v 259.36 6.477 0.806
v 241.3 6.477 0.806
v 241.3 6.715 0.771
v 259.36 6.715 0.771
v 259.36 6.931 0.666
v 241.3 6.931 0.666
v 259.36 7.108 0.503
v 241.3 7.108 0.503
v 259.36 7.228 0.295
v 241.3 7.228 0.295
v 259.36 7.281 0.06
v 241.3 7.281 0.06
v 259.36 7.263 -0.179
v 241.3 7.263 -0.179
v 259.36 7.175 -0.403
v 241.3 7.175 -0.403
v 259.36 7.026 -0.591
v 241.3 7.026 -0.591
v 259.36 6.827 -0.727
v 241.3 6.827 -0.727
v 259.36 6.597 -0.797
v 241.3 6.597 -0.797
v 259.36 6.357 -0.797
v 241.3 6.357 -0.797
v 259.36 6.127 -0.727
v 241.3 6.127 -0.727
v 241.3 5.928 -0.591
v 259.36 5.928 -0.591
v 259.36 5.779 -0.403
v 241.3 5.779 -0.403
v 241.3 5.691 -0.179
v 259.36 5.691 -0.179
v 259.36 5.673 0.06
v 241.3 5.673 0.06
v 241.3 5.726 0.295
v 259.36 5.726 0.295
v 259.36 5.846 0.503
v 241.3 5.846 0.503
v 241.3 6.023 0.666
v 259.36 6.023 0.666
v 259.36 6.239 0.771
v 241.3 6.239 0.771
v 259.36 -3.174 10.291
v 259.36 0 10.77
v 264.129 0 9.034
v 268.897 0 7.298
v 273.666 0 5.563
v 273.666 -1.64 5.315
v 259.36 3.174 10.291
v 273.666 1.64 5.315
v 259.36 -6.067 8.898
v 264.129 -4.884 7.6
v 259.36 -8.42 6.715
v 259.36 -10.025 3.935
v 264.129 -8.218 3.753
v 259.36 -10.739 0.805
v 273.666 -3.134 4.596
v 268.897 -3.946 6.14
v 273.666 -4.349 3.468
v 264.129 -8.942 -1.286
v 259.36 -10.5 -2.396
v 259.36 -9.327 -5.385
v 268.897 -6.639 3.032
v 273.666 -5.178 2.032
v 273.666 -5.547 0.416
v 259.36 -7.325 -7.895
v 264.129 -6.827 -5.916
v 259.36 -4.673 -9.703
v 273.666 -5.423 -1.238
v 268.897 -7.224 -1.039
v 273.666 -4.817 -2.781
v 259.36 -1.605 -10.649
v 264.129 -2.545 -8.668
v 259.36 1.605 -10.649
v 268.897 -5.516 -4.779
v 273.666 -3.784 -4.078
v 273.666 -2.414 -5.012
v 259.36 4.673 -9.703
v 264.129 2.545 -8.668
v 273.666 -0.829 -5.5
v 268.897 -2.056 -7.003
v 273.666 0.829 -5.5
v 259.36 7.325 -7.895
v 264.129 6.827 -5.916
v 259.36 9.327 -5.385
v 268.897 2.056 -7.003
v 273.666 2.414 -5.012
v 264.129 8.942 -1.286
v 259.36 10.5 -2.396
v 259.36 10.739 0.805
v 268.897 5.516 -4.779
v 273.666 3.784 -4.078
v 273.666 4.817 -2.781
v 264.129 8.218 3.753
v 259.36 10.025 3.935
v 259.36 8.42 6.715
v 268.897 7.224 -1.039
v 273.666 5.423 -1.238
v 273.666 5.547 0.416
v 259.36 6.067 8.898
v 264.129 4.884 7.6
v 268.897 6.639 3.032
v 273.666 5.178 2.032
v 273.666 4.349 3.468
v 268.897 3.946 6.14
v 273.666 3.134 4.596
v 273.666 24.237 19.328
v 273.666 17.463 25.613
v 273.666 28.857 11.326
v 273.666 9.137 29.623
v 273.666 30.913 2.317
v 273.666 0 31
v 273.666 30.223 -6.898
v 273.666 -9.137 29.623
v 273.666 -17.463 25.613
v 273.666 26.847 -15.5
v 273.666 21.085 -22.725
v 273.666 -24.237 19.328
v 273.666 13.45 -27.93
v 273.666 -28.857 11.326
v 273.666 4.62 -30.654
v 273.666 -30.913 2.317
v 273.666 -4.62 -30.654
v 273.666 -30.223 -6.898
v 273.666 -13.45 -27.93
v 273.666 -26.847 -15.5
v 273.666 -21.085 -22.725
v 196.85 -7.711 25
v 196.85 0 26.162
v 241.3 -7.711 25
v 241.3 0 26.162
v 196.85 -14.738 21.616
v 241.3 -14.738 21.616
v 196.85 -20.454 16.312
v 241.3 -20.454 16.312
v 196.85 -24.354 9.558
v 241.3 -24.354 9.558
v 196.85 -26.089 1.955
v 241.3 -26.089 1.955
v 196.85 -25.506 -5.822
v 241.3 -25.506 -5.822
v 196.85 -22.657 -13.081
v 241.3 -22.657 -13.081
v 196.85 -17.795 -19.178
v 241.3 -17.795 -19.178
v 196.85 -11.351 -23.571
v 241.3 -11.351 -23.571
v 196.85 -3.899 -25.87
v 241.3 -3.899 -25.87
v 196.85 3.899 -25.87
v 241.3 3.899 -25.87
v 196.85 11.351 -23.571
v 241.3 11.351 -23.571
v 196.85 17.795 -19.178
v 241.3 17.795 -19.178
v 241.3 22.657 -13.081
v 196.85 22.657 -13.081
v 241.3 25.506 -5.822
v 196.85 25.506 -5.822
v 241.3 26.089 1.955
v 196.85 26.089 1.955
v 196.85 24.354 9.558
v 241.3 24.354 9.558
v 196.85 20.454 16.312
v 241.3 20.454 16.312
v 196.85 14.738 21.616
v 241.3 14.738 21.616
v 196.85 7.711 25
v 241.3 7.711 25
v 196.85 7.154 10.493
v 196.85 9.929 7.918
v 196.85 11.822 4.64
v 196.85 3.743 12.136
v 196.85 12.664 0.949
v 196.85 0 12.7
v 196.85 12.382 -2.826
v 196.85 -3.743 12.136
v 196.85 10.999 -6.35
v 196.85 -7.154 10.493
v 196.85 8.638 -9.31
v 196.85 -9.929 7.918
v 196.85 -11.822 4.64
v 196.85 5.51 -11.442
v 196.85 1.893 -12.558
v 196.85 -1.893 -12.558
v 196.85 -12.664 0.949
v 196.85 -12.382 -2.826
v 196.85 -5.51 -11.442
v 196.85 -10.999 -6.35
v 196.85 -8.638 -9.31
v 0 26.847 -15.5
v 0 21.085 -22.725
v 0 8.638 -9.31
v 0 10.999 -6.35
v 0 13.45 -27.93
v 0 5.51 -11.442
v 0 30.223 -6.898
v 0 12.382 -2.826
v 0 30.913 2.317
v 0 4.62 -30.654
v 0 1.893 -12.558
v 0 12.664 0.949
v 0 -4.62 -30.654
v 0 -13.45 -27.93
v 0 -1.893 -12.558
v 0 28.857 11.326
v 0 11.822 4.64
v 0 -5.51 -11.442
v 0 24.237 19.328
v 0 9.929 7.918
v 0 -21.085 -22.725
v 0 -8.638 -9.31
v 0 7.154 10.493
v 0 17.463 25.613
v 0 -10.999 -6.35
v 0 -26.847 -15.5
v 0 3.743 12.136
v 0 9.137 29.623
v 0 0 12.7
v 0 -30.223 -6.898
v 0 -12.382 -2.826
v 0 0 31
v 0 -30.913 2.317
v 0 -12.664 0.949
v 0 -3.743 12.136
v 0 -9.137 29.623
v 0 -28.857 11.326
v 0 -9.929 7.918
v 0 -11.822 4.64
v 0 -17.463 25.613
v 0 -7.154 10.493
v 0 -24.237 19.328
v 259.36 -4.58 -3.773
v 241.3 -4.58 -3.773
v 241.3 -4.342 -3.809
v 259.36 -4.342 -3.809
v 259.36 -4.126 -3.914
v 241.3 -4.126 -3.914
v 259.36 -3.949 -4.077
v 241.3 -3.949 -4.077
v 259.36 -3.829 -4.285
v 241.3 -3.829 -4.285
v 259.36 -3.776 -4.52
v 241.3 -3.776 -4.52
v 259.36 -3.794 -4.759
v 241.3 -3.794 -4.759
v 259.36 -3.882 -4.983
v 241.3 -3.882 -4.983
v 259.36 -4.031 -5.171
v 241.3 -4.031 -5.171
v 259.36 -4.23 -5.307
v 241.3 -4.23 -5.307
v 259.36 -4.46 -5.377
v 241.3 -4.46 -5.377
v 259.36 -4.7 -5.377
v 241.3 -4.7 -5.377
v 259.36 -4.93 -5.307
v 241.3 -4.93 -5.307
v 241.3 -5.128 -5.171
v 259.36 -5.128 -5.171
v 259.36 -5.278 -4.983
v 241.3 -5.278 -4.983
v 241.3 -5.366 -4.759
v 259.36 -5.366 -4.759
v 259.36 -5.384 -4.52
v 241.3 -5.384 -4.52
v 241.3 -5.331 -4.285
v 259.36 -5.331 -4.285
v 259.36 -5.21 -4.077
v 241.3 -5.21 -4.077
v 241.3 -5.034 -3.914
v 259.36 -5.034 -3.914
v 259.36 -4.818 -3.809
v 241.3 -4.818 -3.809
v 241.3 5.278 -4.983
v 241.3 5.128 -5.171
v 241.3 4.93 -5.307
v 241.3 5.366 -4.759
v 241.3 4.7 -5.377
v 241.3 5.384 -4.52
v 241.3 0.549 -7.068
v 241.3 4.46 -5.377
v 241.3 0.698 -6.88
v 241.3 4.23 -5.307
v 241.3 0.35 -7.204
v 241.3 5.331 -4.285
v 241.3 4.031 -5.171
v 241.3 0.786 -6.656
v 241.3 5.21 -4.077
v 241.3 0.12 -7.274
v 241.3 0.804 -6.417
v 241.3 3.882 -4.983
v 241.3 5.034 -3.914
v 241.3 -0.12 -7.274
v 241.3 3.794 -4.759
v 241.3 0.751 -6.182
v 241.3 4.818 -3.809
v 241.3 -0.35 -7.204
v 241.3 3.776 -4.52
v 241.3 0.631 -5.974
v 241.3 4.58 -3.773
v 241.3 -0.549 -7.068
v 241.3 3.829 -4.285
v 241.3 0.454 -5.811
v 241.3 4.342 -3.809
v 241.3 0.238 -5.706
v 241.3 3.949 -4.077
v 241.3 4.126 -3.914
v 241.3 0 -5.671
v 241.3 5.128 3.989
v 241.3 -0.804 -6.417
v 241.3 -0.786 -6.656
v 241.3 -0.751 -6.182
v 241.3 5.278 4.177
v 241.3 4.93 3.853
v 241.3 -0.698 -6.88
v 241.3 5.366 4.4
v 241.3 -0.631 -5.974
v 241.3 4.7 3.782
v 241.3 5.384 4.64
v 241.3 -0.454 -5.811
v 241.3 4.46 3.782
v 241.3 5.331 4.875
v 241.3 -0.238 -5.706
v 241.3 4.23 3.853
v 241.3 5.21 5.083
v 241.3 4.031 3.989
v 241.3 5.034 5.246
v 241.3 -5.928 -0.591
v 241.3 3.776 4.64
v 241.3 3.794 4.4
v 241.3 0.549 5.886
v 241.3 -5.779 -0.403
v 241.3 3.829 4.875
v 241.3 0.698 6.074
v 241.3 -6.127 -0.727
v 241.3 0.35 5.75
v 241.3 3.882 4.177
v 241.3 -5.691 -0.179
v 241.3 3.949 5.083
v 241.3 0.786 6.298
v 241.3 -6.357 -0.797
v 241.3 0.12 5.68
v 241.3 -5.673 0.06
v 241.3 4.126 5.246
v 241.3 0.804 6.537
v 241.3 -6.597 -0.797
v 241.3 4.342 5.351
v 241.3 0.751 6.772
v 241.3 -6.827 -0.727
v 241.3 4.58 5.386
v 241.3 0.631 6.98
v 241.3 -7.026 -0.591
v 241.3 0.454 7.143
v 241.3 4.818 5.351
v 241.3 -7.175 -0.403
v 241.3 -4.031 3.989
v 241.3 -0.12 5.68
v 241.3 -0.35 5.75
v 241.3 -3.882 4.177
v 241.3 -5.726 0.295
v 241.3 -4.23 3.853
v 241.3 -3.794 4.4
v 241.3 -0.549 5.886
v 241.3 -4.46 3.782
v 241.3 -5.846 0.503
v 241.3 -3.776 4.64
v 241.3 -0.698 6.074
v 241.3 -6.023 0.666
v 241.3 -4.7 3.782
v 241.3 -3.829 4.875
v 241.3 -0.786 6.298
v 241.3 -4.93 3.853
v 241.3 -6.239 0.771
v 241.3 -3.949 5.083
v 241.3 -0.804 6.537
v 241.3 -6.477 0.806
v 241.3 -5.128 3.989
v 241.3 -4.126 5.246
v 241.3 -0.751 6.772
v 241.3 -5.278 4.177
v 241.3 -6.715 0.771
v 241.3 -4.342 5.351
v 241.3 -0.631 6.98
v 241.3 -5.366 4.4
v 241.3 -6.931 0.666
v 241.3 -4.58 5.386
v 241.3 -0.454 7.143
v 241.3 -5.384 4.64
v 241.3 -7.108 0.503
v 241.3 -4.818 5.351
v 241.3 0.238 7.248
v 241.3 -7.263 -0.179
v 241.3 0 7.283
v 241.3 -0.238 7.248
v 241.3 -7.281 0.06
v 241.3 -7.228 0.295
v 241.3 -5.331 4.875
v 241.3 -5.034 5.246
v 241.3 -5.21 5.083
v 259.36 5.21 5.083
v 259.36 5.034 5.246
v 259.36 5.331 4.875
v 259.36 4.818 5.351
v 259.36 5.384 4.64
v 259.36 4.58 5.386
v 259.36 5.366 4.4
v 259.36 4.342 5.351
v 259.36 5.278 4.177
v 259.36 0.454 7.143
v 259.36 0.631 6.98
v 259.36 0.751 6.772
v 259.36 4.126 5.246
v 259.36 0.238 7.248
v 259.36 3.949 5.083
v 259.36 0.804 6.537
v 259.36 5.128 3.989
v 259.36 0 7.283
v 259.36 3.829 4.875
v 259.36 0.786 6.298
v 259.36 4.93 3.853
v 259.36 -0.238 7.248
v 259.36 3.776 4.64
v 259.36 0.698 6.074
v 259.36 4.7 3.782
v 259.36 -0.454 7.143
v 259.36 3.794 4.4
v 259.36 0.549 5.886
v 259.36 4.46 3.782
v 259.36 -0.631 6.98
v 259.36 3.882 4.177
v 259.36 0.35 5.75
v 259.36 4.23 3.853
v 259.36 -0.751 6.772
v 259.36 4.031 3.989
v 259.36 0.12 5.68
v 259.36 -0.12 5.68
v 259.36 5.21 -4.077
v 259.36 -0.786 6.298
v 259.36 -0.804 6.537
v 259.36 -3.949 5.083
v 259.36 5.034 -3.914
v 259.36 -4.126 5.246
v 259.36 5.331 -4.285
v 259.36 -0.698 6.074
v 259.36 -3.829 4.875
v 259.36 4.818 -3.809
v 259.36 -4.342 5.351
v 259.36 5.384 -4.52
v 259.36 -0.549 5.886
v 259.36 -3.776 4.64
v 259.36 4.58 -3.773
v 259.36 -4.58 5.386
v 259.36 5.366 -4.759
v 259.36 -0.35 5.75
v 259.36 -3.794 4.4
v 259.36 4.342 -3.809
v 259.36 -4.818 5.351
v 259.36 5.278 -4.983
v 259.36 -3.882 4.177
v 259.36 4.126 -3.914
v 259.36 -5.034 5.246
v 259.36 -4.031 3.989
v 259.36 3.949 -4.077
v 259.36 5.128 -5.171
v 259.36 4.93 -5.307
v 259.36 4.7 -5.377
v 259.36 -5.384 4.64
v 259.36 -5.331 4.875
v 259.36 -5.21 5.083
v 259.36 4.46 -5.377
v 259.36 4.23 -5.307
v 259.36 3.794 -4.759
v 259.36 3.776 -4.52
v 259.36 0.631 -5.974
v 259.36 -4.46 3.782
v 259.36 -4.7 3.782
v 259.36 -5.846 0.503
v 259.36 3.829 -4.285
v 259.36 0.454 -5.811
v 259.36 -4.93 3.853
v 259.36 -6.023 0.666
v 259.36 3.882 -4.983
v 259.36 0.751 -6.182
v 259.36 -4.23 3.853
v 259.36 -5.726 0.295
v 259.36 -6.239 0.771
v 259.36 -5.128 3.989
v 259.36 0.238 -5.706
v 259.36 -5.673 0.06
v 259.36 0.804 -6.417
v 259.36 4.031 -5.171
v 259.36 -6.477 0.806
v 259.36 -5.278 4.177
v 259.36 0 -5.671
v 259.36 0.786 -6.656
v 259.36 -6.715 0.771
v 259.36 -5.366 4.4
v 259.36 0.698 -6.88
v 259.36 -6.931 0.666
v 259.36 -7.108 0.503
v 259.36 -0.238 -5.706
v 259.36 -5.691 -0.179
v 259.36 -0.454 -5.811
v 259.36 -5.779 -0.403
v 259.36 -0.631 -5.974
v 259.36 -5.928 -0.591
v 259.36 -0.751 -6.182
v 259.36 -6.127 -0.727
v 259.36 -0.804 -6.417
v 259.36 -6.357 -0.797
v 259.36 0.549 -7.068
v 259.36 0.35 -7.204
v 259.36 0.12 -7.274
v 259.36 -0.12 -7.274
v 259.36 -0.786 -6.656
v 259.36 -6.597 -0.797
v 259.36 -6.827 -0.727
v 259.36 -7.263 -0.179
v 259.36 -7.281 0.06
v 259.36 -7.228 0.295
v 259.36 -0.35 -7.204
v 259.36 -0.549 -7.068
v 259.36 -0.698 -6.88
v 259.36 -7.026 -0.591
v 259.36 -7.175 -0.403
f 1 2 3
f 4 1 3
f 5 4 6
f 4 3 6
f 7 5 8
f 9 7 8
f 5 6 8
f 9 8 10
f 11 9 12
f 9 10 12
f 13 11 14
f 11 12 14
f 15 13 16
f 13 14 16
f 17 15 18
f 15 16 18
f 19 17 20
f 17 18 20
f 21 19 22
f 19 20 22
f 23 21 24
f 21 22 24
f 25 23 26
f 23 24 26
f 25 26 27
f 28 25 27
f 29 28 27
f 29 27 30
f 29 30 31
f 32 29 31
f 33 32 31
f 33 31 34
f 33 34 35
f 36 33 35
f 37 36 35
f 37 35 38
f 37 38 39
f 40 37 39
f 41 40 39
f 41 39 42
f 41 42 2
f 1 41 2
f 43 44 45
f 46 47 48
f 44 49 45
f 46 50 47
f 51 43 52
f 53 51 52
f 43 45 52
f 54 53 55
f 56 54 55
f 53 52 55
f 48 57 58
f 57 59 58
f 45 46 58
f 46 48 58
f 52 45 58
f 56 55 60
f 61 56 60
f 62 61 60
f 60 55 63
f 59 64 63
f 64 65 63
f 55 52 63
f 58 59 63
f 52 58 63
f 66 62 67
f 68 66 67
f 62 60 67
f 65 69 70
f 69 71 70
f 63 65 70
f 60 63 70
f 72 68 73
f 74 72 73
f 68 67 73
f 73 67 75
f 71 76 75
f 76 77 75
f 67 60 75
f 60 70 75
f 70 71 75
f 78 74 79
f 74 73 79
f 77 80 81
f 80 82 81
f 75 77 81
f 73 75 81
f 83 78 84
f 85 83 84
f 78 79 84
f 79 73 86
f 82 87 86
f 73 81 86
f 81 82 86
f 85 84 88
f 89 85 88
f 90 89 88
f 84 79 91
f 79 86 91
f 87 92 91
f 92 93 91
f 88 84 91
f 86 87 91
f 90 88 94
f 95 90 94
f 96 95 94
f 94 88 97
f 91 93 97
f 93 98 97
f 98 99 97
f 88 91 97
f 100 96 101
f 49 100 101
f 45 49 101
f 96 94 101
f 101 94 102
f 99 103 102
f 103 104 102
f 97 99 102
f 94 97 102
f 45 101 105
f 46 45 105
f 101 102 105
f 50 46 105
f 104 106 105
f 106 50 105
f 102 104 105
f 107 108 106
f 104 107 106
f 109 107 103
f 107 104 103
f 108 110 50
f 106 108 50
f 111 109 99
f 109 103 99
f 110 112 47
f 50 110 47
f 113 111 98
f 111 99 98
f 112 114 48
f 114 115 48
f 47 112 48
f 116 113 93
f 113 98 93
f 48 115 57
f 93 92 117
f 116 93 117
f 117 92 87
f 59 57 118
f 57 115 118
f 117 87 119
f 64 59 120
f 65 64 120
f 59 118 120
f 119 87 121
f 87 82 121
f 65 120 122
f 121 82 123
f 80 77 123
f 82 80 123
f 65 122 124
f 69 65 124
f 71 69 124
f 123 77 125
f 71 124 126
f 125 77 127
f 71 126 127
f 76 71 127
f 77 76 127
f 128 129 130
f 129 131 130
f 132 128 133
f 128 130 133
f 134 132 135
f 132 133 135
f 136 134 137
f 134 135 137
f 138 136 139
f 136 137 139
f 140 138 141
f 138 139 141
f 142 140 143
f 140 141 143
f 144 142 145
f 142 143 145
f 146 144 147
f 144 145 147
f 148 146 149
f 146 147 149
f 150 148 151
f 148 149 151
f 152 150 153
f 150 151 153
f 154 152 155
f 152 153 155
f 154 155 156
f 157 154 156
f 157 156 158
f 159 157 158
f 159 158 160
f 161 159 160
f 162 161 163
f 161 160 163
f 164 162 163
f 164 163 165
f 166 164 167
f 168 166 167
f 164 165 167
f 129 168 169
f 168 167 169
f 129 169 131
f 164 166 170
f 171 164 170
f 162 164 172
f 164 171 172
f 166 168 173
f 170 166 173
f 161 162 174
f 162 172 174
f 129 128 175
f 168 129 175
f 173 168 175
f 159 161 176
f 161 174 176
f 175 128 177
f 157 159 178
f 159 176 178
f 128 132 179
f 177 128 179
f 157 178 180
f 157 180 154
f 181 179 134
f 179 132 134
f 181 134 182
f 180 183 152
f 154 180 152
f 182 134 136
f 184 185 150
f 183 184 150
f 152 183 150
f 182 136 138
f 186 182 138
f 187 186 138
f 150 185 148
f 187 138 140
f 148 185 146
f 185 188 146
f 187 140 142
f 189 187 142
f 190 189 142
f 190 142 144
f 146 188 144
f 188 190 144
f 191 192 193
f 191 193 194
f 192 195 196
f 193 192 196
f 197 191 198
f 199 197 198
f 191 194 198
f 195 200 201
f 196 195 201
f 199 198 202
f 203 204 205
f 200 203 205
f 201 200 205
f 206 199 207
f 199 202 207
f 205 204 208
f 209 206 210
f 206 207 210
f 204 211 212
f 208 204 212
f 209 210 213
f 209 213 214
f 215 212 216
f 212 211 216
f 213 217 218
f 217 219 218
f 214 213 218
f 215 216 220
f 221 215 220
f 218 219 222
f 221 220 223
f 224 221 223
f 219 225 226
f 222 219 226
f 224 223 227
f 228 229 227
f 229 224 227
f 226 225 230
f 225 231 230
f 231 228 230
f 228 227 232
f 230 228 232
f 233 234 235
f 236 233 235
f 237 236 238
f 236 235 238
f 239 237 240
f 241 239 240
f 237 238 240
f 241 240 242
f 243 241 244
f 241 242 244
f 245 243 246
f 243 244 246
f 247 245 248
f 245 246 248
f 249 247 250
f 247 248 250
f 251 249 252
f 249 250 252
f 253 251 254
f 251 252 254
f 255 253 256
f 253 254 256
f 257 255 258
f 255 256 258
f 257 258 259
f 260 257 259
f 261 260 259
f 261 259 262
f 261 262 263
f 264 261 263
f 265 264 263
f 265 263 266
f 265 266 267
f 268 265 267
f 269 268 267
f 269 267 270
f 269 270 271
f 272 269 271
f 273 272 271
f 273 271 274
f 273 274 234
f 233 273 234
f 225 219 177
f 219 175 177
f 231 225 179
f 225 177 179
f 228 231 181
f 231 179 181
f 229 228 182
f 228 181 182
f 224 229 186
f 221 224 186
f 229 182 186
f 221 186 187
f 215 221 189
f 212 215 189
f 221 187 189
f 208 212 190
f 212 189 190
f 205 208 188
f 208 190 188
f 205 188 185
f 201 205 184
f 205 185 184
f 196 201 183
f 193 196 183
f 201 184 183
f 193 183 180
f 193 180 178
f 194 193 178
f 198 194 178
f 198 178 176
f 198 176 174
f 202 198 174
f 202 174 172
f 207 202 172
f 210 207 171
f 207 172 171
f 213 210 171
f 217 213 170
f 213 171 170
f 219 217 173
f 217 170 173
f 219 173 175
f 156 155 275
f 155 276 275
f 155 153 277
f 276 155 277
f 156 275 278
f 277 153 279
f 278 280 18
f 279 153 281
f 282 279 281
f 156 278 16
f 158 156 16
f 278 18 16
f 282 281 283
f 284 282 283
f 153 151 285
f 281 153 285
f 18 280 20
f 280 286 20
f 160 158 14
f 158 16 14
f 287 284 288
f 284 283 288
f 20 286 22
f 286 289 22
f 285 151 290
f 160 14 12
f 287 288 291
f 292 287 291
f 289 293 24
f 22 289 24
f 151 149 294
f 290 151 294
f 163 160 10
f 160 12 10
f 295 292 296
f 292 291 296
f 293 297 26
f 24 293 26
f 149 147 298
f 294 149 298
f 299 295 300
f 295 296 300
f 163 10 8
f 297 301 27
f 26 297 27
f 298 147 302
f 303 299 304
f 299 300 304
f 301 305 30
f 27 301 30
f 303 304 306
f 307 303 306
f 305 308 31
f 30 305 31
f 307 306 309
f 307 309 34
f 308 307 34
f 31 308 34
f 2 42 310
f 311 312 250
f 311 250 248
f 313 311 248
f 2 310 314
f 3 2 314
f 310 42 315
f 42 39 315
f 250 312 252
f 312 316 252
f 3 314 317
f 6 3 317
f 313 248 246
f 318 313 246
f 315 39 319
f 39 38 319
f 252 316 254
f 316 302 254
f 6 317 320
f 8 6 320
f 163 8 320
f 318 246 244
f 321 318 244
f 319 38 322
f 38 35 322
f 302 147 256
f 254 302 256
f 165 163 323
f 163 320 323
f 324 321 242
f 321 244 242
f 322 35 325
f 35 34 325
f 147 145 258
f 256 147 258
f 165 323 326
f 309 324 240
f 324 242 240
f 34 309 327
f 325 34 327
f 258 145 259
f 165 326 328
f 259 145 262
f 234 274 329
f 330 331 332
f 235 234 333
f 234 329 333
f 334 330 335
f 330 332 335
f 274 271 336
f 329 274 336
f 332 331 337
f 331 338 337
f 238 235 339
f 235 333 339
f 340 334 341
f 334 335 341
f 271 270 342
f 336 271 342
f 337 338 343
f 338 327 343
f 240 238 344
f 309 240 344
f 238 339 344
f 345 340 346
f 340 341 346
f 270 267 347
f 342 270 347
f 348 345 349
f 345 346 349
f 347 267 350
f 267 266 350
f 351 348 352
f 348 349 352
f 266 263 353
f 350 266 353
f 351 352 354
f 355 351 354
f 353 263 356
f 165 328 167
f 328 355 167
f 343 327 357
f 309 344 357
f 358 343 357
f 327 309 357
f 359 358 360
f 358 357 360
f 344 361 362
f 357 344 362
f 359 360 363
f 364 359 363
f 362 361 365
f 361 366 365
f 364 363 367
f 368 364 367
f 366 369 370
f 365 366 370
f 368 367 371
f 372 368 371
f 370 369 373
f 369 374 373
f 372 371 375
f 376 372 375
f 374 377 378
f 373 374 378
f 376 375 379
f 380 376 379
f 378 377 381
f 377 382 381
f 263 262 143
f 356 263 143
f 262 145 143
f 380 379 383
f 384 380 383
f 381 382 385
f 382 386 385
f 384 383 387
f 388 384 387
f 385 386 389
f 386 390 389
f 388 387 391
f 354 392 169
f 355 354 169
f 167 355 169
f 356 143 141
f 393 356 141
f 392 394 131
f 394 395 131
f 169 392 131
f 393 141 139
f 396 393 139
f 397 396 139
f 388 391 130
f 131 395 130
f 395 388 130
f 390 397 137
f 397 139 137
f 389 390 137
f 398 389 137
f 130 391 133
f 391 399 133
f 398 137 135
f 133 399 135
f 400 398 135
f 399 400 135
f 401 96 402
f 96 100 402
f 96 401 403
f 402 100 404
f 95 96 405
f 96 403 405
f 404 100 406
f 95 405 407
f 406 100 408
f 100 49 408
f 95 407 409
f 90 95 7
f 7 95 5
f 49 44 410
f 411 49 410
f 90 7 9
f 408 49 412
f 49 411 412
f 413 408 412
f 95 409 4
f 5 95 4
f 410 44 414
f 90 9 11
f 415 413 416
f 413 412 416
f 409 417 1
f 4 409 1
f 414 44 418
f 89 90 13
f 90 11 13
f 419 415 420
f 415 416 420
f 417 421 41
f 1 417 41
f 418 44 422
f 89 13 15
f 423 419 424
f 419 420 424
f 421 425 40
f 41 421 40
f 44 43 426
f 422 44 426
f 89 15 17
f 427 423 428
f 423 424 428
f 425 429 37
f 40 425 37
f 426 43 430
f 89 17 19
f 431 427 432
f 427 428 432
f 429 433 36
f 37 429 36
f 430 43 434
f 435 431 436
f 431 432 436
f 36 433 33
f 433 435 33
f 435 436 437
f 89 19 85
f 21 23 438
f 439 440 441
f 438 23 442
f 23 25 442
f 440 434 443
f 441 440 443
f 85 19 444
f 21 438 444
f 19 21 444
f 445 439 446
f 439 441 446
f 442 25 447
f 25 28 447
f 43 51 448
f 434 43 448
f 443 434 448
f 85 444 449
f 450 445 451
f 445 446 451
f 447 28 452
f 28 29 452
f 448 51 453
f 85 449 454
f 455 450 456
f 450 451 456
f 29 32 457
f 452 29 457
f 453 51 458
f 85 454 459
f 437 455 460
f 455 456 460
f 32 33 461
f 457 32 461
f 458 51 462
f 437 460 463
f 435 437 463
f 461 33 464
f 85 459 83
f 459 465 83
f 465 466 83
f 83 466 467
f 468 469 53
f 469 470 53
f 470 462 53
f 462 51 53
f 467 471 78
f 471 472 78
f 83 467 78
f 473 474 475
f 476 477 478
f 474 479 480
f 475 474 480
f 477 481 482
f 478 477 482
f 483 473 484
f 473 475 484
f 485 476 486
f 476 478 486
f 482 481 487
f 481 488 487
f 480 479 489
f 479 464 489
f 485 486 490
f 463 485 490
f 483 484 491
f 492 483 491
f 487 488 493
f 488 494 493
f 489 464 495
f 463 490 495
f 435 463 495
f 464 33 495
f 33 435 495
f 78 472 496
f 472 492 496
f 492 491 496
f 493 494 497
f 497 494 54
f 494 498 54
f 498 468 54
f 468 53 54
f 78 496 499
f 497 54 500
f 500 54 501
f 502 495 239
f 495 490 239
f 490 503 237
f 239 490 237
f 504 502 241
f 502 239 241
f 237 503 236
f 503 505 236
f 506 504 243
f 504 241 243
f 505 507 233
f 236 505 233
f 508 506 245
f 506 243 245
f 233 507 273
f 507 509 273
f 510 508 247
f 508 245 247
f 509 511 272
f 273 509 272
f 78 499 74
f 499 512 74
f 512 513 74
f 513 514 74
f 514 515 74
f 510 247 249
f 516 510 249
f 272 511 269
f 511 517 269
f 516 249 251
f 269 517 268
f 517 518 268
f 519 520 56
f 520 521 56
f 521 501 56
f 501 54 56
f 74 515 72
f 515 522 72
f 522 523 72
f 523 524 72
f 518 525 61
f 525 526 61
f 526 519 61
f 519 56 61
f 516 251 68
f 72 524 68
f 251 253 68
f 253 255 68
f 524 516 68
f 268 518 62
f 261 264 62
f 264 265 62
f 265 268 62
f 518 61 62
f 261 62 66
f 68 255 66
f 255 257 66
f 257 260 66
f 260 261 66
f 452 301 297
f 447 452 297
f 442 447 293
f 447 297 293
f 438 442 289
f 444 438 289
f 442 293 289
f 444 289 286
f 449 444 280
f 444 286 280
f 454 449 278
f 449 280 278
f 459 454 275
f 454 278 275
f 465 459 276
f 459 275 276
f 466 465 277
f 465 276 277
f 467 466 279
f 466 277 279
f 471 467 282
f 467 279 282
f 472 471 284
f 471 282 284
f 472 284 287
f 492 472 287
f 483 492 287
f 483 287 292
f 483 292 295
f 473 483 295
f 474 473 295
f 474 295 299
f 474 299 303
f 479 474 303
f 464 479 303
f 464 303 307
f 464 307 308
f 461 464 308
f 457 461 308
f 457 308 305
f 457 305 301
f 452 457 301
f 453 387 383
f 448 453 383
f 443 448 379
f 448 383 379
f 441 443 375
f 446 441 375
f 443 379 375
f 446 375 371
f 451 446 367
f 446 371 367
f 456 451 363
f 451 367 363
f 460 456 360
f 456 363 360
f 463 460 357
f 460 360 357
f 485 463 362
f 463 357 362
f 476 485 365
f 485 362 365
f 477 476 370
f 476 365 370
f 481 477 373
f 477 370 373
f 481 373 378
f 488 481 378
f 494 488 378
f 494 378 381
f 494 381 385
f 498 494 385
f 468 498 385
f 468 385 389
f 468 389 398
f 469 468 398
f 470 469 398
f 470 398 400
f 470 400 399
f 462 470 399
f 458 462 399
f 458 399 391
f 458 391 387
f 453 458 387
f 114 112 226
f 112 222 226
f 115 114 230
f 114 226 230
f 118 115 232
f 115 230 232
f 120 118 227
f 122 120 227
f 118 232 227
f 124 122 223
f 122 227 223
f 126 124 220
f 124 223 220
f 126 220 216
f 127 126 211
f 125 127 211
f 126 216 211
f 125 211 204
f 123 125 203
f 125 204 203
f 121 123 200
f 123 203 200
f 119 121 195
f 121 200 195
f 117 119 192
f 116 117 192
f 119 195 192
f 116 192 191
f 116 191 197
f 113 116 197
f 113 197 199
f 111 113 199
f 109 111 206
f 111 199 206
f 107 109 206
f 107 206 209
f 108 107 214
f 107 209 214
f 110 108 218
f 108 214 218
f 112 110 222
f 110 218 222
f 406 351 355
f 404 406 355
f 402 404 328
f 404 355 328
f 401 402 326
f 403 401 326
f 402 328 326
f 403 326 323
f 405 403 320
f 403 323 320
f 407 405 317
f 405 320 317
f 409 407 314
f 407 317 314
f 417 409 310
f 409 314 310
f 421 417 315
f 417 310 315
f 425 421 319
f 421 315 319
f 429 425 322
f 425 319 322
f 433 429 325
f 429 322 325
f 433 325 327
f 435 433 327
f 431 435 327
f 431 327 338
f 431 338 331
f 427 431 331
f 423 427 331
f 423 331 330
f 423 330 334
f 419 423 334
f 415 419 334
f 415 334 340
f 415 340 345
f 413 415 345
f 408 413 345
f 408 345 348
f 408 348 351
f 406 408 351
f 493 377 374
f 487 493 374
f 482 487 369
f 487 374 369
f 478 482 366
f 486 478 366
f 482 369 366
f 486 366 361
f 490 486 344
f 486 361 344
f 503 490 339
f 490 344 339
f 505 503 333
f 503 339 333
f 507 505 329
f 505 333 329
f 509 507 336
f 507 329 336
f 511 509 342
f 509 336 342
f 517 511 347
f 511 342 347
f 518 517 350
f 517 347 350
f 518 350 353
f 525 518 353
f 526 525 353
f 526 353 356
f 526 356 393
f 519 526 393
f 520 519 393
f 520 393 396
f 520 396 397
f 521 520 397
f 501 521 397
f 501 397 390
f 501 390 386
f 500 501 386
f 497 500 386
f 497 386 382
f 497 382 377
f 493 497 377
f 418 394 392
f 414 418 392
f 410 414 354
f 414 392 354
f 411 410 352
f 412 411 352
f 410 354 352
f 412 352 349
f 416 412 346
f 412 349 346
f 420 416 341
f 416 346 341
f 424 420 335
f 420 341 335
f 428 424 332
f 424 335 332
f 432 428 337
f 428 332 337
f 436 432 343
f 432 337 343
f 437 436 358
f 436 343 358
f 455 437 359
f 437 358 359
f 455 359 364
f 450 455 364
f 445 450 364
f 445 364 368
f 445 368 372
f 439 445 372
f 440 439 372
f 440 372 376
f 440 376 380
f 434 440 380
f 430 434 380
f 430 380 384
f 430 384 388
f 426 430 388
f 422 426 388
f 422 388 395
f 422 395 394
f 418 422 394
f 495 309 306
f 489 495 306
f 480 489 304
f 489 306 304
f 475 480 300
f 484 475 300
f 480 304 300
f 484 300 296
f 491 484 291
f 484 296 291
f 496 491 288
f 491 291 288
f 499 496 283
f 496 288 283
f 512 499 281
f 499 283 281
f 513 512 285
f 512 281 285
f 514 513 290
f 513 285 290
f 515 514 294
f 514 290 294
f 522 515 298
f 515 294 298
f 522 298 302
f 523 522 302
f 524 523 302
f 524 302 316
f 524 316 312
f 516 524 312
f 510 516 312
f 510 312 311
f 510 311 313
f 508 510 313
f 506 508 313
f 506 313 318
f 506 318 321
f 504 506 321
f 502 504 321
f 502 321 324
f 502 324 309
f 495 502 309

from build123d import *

# Parameters (mm, degrees)
CUT_EXTRUDE1_REACH = 247.25
SKETCH3_R          = 0.80645


with BuildPart() as part:
    # Sketch1 → Revolve1 (revolve)
    with BuildSketch(Plane.XY, mode=Mode.PRIVATE) as revolve1_sk:
        Polygon((0, 12.7), (196.85, 12.7), (196.85, 26.162), (241.3, 26.162), (241.3, 0), (259.36, 0), (259.36, 10.7696), (273.6661, 5.5626), (273.6661, 31), (0, 31), align=None)
    revolve(revolve1_sk.sketch.rotate(Axis((0, 0, 0), (1, 0, 0)), 90), axis=Axis((0, 0, 0), (1, 0, 0)))

    # Sketch3 → Cut-Extrude1 (cut, up to next)
    with BuildSketch(Plane.ZY.offset(-241.3), mode=Mode.PRIVATE) as cut_extrude1_sk1:
        with Locations((0, 6.477)):
            Circle(SKETCH3_R)
    cut_extrude1_tool1 = extrude(cut_extrude1_sk1.sketch, amount=-CUT_EXTRUDE1_REACH, mode=Mode.PRIVATE) & part.part
    # Sketch3 → Cut-Extrude1 (cut, up to next)
    with BuildSketch(Plane.ZY.offset(-241.3), mode=Mode.PRIVATE) as cut_extrude1_sk2:
        with Locations((4.579930622, 4.579930622)):
            Circle(SKETCH3_R)
    cut_extrude1_tool2 = extrude(cut_extrude1_sk2.sketch, amount=-CUT_EXTRUDE1_REACH, mode=Mode.PRIVATE) & part.part
    # Sketch3 → Cut-Extrude1 (cut, up to next)
    with BuildSketch(Plane.ZY.offset(-241.3), mode=Mode.PRIVATE) as cut_extrude1_sk3:
        with Locations((6.477, 0)):
            Circle(SKETCH3_R)
    cut_extrude1_tool3 = extrude(cut_extrude1_sk3.sketch, amount=-CUT_EXTRUDE1_REACH, mode=Mode.PRIVATE) & part.part
    # Sketch3 → Cut-Extrude1 (cut, up to next)
    with BuildSketch(Plane.ZY.offset(-241.3), mode=Mode.PRIVATE) as cut_extrude1_sk4:
        with Locations((4.579930622, -4.579930622)):
            Circle(SKETCH3_R)
    cut_extrude1_tool4 = extrude(cut_extrude1_sk4.sketch, amount=-CUT_EXTRUDE1_REACH, mode=Mode.PRIVATE) & part.part
    # Sketch3 → Cut-Extrude1 (cut, up to next)
    with BuildSketch(Plane.ZY.offset(-241.3), mode=Mode.PRIVATE) as cut_extrude1_sk5:
        with Locations((0, -6.477)):
            Circle(SKETCH3_R)
    cut_extrude1_tool5 = extrude(cut_extrude1_sk5.sketch, amount=-CUT_EXTRUDE1_REACH, mode=Mode.PRIVATE) & part.part
    # Sketch3 → Cut-Extrude1 (cut, up to next)
    with BuildSketch(Plane.ZY.offset(-241.3), mode=Mode.PRIVATE) as cut_extrude1_sk6:
        with Locations((-4.579930622, -4.579930622)):
            Circle(SKETCH3_R)
    cut_extrude1_tool6 = extrude(cut_extrude1_sk6.sketch, amount=-CUT_EXTRUDE1_REACH, mode=Mode.PRIVATE) & part.part
    # Sketch3 → Cut-Extrude1 (cut, up to next)
    with BuildSketch(Plane.ZY.offset(-241.3), mode=Mode.PRIVATE) as cut_extrude1_sk7:
        with Locations((-6.477, 0)):
            Circle(SKETCH3_R)
    cut_extrude1_tool7 = extrude(cut_extrude1_sk7.sketch, amount=-CUT_EXTRUDE1_REACH, mode=Mode.PRIVATE) & part.part
    # Sketch3 → Cut-Extrude1 (cut, up to next)
    with BuildSketch(Plane.ZY.offset(-241.3), mode=Mode.PRIVATE) as cut_extrude1_sk8:
        with Locations((-4.579930622, 4.579930622)):
            Circle(SKETCH3_R)
    cut_extrude1_tool8 = extrude(cut_extrude1_sk8.sketch, amount=-CUT_EXTRUDE1_REACH, mode=Mode.PRIVATE) & part.part
    add(cut_extrude1_tool1.solids().sort_by_distance((241.3, 6.477, 0))[0], mode=Mode.SUBTRACT)
    add(cut_extrude1_tool2.solids().sort_by_distance((241.3, 4.579931, 4.579931))[0], mode=Mode.SUBTRACT)
    add(cut_extrude1_tool3.solids().sort_by_distance((241.3, 0, 6.477))[0], mode=Mode.SUBTRACT)
    add(cut_extrude1_tool4.solids().sort_by_distance((241.3, -4.579931, 4.579931))[0], mode=Mode.SUBTRACT)
    add(cut_extrude1_tool5.solids().sort_by_distance((241.3, -6.477, 0))[0], mode=Mode.SUBTRACT)
    add(cut_extrude1_tool6.solids().sort_by_distance((241.3, -4.579931, -4.579931))[0], mode=Mode.SUBTRACT)
    add(cut_extrude1_tool7.solids().sort_by_distance((241.3, 0, -6.477))[0], mode=Mode.SUBTRACT)
    add(cut_extrude1_tool8.solids().sort_by_distance((241.3, 4.579931, -4.579931))[0], mode=Mode.SUBTRACT)


solid = part.part
